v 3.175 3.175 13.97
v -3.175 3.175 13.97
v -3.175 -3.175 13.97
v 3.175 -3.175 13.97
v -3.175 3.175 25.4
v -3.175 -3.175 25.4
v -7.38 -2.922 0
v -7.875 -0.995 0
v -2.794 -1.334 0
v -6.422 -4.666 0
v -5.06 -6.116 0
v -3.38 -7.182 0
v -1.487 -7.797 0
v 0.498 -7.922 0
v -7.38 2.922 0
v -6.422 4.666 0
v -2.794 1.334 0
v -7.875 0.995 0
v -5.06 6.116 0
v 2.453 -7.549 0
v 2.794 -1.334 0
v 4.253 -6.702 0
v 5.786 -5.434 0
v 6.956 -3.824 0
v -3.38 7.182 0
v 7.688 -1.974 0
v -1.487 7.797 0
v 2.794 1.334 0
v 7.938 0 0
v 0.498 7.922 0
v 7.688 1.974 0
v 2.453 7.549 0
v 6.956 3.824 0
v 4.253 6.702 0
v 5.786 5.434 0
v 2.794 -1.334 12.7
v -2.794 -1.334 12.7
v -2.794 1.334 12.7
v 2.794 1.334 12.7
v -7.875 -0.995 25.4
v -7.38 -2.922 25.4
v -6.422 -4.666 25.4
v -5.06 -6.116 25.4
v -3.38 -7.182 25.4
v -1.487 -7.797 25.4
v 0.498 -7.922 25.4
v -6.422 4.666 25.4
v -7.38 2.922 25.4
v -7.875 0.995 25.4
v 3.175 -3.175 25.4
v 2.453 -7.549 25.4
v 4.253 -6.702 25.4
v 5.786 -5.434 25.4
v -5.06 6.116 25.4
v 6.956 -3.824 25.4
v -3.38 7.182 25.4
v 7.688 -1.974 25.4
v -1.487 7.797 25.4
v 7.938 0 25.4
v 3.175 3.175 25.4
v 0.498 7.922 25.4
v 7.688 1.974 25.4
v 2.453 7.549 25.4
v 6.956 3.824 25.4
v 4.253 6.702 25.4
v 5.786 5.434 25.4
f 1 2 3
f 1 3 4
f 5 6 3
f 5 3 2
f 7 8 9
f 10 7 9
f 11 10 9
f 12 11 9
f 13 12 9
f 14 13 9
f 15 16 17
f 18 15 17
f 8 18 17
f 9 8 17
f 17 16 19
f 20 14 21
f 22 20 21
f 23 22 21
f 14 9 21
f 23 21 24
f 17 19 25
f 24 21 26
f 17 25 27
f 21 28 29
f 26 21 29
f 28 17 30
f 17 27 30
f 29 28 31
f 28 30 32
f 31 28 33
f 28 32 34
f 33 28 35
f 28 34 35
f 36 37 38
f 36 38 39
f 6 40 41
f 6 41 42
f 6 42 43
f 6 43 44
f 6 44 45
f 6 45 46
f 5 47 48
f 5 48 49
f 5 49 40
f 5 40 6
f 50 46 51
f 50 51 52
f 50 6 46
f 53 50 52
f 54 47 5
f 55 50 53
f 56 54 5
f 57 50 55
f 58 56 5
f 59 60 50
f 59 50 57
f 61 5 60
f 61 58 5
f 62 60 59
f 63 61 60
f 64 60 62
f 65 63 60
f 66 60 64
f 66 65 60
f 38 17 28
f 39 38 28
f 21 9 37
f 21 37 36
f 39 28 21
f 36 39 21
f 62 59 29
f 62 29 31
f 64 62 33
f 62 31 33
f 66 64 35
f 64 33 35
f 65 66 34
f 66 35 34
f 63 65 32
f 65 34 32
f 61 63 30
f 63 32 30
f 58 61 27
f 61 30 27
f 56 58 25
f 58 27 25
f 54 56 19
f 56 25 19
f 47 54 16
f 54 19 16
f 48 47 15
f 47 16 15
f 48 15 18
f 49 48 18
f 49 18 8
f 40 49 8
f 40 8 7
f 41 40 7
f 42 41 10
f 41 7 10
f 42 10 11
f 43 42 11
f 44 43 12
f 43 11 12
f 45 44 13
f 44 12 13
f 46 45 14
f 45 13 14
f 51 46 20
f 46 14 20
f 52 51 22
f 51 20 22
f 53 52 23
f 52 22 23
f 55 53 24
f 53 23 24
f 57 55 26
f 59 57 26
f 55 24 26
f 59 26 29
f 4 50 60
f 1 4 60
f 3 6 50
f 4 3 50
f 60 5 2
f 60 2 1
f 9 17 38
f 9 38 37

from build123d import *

# Parameters (mm, degrees)
F0_R     = 7.9375
F1_DEPTH = 25.4
F2_W     = 6.35
F2_H     = 6.35
F3_DEPTH = 11.43
F4_W     = 5.588
F4_H     = 2.667
F5_DEPTH = 12.7


with BuildPart() as f1:
    # F0 (on Top) → F1 (new body)
    with BuildSketch(Plane.XY):
        Circle(F0_R)
    extrude(amount=F1_DEPTH)

    # F2 (on face) → F3 (cut)
    with BuildSketch(Plane.XY.offset(25.4)):
        Rectangle(F2_W, F2_H)
    extrude(amount=-F3_DEPTH, mode=Mode.SUBTRACT)

    # F4 (on face) → F5 (cut)
    with BuildSketch(Plane(origin=(0, 0, 0), x_dir=(1, 0, 0), z_dir=(0, 0, -1))):
        Rectangle(F4_W, F4_H)
    extrude(amount=-F5_DEPTH, mode=Mode.SUBTRACT)


solid = f1.part
